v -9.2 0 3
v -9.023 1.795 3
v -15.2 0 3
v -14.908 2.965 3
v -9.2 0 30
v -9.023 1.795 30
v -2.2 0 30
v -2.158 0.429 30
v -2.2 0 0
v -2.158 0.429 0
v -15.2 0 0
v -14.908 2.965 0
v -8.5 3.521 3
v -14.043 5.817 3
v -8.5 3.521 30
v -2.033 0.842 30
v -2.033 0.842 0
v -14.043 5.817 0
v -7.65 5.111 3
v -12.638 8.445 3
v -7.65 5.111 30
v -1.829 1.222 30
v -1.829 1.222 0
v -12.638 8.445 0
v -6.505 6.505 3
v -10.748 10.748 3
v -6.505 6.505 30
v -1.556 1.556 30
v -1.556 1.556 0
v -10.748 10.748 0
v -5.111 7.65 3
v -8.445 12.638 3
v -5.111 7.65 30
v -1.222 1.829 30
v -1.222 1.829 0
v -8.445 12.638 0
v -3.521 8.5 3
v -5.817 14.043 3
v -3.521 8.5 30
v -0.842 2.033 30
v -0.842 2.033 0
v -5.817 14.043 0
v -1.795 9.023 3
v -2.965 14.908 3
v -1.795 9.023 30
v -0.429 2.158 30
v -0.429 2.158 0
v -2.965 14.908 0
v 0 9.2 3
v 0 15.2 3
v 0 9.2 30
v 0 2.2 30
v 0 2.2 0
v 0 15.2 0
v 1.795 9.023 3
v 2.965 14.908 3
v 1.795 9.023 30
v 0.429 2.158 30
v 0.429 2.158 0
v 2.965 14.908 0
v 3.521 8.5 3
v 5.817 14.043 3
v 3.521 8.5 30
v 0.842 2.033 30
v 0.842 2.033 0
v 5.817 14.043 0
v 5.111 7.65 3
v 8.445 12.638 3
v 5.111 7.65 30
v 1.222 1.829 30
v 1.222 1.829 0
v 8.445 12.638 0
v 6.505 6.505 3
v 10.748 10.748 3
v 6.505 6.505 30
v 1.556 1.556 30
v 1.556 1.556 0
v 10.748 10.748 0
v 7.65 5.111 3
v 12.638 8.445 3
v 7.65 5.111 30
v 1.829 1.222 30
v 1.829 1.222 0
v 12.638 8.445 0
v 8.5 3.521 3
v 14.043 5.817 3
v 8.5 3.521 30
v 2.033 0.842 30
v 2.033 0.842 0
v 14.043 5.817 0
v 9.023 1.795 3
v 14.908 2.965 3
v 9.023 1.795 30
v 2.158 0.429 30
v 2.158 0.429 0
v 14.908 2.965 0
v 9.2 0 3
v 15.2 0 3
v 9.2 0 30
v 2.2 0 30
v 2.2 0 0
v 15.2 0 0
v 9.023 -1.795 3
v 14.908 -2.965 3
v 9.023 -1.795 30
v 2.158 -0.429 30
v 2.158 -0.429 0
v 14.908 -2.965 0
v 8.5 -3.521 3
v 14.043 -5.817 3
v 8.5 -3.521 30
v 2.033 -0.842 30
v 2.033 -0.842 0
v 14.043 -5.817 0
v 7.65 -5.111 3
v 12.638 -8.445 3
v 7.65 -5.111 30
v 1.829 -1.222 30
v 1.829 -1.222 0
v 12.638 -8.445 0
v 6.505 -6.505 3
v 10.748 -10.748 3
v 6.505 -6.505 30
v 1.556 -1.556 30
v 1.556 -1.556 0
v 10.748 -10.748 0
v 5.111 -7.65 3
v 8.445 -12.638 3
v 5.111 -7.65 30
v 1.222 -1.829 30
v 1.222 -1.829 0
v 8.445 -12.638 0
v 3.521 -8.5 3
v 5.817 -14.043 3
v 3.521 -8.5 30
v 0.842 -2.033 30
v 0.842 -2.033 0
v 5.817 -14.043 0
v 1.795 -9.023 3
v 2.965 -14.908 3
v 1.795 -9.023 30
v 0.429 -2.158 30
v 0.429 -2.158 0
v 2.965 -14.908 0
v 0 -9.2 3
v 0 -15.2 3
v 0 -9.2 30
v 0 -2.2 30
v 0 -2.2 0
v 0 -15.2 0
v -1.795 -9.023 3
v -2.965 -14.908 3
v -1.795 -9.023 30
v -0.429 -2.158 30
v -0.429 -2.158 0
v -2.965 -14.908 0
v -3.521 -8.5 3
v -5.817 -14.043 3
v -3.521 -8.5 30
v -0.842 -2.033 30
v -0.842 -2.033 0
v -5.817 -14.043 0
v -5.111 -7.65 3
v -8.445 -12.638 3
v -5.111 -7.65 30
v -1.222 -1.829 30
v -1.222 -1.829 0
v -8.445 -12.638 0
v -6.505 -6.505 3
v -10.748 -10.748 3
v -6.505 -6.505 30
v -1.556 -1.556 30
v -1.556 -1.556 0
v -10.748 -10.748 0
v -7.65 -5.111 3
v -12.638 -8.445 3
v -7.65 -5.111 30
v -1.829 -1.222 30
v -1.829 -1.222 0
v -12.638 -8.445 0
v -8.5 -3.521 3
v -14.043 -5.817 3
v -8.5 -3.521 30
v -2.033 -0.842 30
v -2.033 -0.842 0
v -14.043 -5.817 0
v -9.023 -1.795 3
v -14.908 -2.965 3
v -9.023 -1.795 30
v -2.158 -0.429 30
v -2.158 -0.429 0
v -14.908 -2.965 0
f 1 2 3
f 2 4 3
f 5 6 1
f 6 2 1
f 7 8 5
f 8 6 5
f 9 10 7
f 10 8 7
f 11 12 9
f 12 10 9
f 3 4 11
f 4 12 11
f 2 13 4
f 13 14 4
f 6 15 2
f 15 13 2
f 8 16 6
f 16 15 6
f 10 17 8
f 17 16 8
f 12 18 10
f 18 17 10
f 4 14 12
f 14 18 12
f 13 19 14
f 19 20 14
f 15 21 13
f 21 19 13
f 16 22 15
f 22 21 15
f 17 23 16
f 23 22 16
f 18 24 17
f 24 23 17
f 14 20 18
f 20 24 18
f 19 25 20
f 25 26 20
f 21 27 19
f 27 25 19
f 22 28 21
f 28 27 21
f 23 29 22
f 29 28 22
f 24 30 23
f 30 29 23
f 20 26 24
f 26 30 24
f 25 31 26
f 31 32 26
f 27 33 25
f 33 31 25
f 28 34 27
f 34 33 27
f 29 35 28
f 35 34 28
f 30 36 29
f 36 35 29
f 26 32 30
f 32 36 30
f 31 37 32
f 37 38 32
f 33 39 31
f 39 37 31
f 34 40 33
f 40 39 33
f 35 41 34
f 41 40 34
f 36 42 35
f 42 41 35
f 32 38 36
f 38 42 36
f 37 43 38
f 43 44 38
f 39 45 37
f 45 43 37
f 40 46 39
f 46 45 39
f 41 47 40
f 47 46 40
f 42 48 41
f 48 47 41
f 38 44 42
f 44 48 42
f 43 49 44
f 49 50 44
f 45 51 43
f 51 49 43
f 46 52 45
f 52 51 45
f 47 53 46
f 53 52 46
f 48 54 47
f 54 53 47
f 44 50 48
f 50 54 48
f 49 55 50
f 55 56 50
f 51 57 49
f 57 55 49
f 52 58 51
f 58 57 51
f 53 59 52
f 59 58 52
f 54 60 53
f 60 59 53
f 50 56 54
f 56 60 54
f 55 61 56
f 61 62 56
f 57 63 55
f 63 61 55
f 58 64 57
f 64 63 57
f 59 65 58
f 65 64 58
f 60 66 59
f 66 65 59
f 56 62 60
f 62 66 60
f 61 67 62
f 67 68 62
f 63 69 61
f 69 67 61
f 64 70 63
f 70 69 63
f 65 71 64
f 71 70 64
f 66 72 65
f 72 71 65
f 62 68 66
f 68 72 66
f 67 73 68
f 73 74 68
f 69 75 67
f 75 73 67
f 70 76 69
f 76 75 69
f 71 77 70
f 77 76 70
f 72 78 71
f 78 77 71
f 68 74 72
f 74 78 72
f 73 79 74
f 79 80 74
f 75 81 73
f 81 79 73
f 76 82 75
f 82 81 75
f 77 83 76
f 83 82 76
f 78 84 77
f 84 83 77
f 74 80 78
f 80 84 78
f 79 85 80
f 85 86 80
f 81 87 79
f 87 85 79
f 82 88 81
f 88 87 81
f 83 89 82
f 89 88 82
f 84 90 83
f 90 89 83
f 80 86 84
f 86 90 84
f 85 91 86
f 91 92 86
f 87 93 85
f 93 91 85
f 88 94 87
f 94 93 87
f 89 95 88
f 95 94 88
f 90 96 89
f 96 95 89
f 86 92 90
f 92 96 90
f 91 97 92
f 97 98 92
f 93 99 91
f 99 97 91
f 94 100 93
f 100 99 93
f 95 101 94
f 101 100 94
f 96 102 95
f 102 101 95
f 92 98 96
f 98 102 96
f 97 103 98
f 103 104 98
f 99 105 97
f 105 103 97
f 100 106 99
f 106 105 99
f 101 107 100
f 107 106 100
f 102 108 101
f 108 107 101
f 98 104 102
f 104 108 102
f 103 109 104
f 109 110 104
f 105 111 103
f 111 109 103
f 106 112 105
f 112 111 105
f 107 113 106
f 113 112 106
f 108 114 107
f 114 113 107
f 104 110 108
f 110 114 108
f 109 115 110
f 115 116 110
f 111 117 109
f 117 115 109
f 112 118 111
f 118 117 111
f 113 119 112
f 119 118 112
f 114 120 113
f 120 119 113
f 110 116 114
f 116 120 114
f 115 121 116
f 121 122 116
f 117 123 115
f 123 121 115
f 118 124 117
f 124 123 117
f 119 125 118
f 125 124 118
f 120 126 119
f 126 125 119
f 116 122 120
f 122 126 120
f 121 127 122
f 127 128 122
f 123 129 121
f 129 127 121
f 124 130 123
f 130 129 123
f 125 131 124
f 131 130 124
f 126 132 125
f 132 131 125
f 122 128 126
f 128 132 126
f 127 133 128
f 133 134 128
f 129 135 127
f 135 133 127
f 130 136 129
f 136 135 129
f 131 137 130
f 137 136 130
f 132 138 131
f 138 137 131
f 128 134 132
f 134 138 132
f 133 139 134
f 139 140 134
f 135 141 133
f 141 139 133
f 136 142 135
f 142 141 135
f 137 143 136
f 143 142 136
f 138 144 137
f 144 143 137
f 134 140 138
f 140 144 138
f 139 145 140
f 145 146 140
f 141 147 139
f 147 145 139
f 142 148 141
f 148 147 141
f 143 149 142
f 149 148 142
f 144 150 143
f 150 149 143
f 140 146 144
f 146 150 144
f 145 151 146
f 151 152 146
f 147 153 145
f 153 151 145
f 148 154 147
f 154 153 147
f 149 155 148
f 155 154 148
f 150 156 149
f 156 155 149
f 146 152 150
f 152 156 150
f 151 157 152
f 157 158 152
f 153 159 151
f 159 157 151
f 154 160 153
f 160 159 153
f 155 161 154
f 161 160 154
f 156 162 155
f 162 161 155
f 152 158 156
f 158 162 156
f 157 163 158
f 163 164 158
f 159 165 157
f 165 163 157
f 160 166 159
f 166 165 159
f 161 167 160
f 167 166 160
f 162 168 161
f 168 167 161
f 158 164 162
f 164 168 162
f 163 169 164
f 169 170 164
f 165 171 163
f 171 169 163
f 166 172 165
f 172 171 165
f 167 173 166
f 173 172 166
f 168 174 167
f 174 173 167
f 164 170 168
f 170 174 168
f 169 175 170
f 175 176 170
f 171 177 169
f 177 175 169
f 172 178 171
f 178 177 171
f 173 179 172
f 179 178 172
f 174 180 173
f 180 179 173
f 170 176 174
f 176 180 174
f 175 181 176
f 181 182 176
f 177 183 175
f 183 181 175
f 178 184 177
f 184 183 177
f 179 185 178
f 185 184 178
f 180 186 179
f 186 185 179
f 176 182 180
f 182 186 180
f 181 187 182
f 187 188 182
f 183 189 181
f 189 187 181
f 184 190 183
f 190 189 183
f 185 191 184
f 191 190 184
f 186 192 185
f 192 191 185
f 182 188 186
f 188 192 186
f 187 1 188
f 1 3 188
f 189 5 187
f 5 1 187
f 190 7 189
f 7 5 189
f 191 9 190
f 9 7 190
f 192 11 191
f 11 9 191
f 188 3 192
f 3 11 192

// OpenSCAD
$fn = 32;

// ----------------------------------------------------------------------
// Profiled standoff: flanged spacer, 30 mm long, bore 4.4 mm
// ----------------------------------------------------------------------

// --- parameters (mm) ---
revolve_angle = 360;      // full turn around the Z axis
profile_points = 6;       // points of the closed outline

profile = [[2.2, 0], [15.2, 0], [15.2, 3], [9.2, 3], [9.2, 30], [2.2, 30]];  // single closed polygon, 6 points, counter clockwise

// --- the one profile operation ---
rotate_extrude(angle = revolve_angle) polygon(points = profile);
